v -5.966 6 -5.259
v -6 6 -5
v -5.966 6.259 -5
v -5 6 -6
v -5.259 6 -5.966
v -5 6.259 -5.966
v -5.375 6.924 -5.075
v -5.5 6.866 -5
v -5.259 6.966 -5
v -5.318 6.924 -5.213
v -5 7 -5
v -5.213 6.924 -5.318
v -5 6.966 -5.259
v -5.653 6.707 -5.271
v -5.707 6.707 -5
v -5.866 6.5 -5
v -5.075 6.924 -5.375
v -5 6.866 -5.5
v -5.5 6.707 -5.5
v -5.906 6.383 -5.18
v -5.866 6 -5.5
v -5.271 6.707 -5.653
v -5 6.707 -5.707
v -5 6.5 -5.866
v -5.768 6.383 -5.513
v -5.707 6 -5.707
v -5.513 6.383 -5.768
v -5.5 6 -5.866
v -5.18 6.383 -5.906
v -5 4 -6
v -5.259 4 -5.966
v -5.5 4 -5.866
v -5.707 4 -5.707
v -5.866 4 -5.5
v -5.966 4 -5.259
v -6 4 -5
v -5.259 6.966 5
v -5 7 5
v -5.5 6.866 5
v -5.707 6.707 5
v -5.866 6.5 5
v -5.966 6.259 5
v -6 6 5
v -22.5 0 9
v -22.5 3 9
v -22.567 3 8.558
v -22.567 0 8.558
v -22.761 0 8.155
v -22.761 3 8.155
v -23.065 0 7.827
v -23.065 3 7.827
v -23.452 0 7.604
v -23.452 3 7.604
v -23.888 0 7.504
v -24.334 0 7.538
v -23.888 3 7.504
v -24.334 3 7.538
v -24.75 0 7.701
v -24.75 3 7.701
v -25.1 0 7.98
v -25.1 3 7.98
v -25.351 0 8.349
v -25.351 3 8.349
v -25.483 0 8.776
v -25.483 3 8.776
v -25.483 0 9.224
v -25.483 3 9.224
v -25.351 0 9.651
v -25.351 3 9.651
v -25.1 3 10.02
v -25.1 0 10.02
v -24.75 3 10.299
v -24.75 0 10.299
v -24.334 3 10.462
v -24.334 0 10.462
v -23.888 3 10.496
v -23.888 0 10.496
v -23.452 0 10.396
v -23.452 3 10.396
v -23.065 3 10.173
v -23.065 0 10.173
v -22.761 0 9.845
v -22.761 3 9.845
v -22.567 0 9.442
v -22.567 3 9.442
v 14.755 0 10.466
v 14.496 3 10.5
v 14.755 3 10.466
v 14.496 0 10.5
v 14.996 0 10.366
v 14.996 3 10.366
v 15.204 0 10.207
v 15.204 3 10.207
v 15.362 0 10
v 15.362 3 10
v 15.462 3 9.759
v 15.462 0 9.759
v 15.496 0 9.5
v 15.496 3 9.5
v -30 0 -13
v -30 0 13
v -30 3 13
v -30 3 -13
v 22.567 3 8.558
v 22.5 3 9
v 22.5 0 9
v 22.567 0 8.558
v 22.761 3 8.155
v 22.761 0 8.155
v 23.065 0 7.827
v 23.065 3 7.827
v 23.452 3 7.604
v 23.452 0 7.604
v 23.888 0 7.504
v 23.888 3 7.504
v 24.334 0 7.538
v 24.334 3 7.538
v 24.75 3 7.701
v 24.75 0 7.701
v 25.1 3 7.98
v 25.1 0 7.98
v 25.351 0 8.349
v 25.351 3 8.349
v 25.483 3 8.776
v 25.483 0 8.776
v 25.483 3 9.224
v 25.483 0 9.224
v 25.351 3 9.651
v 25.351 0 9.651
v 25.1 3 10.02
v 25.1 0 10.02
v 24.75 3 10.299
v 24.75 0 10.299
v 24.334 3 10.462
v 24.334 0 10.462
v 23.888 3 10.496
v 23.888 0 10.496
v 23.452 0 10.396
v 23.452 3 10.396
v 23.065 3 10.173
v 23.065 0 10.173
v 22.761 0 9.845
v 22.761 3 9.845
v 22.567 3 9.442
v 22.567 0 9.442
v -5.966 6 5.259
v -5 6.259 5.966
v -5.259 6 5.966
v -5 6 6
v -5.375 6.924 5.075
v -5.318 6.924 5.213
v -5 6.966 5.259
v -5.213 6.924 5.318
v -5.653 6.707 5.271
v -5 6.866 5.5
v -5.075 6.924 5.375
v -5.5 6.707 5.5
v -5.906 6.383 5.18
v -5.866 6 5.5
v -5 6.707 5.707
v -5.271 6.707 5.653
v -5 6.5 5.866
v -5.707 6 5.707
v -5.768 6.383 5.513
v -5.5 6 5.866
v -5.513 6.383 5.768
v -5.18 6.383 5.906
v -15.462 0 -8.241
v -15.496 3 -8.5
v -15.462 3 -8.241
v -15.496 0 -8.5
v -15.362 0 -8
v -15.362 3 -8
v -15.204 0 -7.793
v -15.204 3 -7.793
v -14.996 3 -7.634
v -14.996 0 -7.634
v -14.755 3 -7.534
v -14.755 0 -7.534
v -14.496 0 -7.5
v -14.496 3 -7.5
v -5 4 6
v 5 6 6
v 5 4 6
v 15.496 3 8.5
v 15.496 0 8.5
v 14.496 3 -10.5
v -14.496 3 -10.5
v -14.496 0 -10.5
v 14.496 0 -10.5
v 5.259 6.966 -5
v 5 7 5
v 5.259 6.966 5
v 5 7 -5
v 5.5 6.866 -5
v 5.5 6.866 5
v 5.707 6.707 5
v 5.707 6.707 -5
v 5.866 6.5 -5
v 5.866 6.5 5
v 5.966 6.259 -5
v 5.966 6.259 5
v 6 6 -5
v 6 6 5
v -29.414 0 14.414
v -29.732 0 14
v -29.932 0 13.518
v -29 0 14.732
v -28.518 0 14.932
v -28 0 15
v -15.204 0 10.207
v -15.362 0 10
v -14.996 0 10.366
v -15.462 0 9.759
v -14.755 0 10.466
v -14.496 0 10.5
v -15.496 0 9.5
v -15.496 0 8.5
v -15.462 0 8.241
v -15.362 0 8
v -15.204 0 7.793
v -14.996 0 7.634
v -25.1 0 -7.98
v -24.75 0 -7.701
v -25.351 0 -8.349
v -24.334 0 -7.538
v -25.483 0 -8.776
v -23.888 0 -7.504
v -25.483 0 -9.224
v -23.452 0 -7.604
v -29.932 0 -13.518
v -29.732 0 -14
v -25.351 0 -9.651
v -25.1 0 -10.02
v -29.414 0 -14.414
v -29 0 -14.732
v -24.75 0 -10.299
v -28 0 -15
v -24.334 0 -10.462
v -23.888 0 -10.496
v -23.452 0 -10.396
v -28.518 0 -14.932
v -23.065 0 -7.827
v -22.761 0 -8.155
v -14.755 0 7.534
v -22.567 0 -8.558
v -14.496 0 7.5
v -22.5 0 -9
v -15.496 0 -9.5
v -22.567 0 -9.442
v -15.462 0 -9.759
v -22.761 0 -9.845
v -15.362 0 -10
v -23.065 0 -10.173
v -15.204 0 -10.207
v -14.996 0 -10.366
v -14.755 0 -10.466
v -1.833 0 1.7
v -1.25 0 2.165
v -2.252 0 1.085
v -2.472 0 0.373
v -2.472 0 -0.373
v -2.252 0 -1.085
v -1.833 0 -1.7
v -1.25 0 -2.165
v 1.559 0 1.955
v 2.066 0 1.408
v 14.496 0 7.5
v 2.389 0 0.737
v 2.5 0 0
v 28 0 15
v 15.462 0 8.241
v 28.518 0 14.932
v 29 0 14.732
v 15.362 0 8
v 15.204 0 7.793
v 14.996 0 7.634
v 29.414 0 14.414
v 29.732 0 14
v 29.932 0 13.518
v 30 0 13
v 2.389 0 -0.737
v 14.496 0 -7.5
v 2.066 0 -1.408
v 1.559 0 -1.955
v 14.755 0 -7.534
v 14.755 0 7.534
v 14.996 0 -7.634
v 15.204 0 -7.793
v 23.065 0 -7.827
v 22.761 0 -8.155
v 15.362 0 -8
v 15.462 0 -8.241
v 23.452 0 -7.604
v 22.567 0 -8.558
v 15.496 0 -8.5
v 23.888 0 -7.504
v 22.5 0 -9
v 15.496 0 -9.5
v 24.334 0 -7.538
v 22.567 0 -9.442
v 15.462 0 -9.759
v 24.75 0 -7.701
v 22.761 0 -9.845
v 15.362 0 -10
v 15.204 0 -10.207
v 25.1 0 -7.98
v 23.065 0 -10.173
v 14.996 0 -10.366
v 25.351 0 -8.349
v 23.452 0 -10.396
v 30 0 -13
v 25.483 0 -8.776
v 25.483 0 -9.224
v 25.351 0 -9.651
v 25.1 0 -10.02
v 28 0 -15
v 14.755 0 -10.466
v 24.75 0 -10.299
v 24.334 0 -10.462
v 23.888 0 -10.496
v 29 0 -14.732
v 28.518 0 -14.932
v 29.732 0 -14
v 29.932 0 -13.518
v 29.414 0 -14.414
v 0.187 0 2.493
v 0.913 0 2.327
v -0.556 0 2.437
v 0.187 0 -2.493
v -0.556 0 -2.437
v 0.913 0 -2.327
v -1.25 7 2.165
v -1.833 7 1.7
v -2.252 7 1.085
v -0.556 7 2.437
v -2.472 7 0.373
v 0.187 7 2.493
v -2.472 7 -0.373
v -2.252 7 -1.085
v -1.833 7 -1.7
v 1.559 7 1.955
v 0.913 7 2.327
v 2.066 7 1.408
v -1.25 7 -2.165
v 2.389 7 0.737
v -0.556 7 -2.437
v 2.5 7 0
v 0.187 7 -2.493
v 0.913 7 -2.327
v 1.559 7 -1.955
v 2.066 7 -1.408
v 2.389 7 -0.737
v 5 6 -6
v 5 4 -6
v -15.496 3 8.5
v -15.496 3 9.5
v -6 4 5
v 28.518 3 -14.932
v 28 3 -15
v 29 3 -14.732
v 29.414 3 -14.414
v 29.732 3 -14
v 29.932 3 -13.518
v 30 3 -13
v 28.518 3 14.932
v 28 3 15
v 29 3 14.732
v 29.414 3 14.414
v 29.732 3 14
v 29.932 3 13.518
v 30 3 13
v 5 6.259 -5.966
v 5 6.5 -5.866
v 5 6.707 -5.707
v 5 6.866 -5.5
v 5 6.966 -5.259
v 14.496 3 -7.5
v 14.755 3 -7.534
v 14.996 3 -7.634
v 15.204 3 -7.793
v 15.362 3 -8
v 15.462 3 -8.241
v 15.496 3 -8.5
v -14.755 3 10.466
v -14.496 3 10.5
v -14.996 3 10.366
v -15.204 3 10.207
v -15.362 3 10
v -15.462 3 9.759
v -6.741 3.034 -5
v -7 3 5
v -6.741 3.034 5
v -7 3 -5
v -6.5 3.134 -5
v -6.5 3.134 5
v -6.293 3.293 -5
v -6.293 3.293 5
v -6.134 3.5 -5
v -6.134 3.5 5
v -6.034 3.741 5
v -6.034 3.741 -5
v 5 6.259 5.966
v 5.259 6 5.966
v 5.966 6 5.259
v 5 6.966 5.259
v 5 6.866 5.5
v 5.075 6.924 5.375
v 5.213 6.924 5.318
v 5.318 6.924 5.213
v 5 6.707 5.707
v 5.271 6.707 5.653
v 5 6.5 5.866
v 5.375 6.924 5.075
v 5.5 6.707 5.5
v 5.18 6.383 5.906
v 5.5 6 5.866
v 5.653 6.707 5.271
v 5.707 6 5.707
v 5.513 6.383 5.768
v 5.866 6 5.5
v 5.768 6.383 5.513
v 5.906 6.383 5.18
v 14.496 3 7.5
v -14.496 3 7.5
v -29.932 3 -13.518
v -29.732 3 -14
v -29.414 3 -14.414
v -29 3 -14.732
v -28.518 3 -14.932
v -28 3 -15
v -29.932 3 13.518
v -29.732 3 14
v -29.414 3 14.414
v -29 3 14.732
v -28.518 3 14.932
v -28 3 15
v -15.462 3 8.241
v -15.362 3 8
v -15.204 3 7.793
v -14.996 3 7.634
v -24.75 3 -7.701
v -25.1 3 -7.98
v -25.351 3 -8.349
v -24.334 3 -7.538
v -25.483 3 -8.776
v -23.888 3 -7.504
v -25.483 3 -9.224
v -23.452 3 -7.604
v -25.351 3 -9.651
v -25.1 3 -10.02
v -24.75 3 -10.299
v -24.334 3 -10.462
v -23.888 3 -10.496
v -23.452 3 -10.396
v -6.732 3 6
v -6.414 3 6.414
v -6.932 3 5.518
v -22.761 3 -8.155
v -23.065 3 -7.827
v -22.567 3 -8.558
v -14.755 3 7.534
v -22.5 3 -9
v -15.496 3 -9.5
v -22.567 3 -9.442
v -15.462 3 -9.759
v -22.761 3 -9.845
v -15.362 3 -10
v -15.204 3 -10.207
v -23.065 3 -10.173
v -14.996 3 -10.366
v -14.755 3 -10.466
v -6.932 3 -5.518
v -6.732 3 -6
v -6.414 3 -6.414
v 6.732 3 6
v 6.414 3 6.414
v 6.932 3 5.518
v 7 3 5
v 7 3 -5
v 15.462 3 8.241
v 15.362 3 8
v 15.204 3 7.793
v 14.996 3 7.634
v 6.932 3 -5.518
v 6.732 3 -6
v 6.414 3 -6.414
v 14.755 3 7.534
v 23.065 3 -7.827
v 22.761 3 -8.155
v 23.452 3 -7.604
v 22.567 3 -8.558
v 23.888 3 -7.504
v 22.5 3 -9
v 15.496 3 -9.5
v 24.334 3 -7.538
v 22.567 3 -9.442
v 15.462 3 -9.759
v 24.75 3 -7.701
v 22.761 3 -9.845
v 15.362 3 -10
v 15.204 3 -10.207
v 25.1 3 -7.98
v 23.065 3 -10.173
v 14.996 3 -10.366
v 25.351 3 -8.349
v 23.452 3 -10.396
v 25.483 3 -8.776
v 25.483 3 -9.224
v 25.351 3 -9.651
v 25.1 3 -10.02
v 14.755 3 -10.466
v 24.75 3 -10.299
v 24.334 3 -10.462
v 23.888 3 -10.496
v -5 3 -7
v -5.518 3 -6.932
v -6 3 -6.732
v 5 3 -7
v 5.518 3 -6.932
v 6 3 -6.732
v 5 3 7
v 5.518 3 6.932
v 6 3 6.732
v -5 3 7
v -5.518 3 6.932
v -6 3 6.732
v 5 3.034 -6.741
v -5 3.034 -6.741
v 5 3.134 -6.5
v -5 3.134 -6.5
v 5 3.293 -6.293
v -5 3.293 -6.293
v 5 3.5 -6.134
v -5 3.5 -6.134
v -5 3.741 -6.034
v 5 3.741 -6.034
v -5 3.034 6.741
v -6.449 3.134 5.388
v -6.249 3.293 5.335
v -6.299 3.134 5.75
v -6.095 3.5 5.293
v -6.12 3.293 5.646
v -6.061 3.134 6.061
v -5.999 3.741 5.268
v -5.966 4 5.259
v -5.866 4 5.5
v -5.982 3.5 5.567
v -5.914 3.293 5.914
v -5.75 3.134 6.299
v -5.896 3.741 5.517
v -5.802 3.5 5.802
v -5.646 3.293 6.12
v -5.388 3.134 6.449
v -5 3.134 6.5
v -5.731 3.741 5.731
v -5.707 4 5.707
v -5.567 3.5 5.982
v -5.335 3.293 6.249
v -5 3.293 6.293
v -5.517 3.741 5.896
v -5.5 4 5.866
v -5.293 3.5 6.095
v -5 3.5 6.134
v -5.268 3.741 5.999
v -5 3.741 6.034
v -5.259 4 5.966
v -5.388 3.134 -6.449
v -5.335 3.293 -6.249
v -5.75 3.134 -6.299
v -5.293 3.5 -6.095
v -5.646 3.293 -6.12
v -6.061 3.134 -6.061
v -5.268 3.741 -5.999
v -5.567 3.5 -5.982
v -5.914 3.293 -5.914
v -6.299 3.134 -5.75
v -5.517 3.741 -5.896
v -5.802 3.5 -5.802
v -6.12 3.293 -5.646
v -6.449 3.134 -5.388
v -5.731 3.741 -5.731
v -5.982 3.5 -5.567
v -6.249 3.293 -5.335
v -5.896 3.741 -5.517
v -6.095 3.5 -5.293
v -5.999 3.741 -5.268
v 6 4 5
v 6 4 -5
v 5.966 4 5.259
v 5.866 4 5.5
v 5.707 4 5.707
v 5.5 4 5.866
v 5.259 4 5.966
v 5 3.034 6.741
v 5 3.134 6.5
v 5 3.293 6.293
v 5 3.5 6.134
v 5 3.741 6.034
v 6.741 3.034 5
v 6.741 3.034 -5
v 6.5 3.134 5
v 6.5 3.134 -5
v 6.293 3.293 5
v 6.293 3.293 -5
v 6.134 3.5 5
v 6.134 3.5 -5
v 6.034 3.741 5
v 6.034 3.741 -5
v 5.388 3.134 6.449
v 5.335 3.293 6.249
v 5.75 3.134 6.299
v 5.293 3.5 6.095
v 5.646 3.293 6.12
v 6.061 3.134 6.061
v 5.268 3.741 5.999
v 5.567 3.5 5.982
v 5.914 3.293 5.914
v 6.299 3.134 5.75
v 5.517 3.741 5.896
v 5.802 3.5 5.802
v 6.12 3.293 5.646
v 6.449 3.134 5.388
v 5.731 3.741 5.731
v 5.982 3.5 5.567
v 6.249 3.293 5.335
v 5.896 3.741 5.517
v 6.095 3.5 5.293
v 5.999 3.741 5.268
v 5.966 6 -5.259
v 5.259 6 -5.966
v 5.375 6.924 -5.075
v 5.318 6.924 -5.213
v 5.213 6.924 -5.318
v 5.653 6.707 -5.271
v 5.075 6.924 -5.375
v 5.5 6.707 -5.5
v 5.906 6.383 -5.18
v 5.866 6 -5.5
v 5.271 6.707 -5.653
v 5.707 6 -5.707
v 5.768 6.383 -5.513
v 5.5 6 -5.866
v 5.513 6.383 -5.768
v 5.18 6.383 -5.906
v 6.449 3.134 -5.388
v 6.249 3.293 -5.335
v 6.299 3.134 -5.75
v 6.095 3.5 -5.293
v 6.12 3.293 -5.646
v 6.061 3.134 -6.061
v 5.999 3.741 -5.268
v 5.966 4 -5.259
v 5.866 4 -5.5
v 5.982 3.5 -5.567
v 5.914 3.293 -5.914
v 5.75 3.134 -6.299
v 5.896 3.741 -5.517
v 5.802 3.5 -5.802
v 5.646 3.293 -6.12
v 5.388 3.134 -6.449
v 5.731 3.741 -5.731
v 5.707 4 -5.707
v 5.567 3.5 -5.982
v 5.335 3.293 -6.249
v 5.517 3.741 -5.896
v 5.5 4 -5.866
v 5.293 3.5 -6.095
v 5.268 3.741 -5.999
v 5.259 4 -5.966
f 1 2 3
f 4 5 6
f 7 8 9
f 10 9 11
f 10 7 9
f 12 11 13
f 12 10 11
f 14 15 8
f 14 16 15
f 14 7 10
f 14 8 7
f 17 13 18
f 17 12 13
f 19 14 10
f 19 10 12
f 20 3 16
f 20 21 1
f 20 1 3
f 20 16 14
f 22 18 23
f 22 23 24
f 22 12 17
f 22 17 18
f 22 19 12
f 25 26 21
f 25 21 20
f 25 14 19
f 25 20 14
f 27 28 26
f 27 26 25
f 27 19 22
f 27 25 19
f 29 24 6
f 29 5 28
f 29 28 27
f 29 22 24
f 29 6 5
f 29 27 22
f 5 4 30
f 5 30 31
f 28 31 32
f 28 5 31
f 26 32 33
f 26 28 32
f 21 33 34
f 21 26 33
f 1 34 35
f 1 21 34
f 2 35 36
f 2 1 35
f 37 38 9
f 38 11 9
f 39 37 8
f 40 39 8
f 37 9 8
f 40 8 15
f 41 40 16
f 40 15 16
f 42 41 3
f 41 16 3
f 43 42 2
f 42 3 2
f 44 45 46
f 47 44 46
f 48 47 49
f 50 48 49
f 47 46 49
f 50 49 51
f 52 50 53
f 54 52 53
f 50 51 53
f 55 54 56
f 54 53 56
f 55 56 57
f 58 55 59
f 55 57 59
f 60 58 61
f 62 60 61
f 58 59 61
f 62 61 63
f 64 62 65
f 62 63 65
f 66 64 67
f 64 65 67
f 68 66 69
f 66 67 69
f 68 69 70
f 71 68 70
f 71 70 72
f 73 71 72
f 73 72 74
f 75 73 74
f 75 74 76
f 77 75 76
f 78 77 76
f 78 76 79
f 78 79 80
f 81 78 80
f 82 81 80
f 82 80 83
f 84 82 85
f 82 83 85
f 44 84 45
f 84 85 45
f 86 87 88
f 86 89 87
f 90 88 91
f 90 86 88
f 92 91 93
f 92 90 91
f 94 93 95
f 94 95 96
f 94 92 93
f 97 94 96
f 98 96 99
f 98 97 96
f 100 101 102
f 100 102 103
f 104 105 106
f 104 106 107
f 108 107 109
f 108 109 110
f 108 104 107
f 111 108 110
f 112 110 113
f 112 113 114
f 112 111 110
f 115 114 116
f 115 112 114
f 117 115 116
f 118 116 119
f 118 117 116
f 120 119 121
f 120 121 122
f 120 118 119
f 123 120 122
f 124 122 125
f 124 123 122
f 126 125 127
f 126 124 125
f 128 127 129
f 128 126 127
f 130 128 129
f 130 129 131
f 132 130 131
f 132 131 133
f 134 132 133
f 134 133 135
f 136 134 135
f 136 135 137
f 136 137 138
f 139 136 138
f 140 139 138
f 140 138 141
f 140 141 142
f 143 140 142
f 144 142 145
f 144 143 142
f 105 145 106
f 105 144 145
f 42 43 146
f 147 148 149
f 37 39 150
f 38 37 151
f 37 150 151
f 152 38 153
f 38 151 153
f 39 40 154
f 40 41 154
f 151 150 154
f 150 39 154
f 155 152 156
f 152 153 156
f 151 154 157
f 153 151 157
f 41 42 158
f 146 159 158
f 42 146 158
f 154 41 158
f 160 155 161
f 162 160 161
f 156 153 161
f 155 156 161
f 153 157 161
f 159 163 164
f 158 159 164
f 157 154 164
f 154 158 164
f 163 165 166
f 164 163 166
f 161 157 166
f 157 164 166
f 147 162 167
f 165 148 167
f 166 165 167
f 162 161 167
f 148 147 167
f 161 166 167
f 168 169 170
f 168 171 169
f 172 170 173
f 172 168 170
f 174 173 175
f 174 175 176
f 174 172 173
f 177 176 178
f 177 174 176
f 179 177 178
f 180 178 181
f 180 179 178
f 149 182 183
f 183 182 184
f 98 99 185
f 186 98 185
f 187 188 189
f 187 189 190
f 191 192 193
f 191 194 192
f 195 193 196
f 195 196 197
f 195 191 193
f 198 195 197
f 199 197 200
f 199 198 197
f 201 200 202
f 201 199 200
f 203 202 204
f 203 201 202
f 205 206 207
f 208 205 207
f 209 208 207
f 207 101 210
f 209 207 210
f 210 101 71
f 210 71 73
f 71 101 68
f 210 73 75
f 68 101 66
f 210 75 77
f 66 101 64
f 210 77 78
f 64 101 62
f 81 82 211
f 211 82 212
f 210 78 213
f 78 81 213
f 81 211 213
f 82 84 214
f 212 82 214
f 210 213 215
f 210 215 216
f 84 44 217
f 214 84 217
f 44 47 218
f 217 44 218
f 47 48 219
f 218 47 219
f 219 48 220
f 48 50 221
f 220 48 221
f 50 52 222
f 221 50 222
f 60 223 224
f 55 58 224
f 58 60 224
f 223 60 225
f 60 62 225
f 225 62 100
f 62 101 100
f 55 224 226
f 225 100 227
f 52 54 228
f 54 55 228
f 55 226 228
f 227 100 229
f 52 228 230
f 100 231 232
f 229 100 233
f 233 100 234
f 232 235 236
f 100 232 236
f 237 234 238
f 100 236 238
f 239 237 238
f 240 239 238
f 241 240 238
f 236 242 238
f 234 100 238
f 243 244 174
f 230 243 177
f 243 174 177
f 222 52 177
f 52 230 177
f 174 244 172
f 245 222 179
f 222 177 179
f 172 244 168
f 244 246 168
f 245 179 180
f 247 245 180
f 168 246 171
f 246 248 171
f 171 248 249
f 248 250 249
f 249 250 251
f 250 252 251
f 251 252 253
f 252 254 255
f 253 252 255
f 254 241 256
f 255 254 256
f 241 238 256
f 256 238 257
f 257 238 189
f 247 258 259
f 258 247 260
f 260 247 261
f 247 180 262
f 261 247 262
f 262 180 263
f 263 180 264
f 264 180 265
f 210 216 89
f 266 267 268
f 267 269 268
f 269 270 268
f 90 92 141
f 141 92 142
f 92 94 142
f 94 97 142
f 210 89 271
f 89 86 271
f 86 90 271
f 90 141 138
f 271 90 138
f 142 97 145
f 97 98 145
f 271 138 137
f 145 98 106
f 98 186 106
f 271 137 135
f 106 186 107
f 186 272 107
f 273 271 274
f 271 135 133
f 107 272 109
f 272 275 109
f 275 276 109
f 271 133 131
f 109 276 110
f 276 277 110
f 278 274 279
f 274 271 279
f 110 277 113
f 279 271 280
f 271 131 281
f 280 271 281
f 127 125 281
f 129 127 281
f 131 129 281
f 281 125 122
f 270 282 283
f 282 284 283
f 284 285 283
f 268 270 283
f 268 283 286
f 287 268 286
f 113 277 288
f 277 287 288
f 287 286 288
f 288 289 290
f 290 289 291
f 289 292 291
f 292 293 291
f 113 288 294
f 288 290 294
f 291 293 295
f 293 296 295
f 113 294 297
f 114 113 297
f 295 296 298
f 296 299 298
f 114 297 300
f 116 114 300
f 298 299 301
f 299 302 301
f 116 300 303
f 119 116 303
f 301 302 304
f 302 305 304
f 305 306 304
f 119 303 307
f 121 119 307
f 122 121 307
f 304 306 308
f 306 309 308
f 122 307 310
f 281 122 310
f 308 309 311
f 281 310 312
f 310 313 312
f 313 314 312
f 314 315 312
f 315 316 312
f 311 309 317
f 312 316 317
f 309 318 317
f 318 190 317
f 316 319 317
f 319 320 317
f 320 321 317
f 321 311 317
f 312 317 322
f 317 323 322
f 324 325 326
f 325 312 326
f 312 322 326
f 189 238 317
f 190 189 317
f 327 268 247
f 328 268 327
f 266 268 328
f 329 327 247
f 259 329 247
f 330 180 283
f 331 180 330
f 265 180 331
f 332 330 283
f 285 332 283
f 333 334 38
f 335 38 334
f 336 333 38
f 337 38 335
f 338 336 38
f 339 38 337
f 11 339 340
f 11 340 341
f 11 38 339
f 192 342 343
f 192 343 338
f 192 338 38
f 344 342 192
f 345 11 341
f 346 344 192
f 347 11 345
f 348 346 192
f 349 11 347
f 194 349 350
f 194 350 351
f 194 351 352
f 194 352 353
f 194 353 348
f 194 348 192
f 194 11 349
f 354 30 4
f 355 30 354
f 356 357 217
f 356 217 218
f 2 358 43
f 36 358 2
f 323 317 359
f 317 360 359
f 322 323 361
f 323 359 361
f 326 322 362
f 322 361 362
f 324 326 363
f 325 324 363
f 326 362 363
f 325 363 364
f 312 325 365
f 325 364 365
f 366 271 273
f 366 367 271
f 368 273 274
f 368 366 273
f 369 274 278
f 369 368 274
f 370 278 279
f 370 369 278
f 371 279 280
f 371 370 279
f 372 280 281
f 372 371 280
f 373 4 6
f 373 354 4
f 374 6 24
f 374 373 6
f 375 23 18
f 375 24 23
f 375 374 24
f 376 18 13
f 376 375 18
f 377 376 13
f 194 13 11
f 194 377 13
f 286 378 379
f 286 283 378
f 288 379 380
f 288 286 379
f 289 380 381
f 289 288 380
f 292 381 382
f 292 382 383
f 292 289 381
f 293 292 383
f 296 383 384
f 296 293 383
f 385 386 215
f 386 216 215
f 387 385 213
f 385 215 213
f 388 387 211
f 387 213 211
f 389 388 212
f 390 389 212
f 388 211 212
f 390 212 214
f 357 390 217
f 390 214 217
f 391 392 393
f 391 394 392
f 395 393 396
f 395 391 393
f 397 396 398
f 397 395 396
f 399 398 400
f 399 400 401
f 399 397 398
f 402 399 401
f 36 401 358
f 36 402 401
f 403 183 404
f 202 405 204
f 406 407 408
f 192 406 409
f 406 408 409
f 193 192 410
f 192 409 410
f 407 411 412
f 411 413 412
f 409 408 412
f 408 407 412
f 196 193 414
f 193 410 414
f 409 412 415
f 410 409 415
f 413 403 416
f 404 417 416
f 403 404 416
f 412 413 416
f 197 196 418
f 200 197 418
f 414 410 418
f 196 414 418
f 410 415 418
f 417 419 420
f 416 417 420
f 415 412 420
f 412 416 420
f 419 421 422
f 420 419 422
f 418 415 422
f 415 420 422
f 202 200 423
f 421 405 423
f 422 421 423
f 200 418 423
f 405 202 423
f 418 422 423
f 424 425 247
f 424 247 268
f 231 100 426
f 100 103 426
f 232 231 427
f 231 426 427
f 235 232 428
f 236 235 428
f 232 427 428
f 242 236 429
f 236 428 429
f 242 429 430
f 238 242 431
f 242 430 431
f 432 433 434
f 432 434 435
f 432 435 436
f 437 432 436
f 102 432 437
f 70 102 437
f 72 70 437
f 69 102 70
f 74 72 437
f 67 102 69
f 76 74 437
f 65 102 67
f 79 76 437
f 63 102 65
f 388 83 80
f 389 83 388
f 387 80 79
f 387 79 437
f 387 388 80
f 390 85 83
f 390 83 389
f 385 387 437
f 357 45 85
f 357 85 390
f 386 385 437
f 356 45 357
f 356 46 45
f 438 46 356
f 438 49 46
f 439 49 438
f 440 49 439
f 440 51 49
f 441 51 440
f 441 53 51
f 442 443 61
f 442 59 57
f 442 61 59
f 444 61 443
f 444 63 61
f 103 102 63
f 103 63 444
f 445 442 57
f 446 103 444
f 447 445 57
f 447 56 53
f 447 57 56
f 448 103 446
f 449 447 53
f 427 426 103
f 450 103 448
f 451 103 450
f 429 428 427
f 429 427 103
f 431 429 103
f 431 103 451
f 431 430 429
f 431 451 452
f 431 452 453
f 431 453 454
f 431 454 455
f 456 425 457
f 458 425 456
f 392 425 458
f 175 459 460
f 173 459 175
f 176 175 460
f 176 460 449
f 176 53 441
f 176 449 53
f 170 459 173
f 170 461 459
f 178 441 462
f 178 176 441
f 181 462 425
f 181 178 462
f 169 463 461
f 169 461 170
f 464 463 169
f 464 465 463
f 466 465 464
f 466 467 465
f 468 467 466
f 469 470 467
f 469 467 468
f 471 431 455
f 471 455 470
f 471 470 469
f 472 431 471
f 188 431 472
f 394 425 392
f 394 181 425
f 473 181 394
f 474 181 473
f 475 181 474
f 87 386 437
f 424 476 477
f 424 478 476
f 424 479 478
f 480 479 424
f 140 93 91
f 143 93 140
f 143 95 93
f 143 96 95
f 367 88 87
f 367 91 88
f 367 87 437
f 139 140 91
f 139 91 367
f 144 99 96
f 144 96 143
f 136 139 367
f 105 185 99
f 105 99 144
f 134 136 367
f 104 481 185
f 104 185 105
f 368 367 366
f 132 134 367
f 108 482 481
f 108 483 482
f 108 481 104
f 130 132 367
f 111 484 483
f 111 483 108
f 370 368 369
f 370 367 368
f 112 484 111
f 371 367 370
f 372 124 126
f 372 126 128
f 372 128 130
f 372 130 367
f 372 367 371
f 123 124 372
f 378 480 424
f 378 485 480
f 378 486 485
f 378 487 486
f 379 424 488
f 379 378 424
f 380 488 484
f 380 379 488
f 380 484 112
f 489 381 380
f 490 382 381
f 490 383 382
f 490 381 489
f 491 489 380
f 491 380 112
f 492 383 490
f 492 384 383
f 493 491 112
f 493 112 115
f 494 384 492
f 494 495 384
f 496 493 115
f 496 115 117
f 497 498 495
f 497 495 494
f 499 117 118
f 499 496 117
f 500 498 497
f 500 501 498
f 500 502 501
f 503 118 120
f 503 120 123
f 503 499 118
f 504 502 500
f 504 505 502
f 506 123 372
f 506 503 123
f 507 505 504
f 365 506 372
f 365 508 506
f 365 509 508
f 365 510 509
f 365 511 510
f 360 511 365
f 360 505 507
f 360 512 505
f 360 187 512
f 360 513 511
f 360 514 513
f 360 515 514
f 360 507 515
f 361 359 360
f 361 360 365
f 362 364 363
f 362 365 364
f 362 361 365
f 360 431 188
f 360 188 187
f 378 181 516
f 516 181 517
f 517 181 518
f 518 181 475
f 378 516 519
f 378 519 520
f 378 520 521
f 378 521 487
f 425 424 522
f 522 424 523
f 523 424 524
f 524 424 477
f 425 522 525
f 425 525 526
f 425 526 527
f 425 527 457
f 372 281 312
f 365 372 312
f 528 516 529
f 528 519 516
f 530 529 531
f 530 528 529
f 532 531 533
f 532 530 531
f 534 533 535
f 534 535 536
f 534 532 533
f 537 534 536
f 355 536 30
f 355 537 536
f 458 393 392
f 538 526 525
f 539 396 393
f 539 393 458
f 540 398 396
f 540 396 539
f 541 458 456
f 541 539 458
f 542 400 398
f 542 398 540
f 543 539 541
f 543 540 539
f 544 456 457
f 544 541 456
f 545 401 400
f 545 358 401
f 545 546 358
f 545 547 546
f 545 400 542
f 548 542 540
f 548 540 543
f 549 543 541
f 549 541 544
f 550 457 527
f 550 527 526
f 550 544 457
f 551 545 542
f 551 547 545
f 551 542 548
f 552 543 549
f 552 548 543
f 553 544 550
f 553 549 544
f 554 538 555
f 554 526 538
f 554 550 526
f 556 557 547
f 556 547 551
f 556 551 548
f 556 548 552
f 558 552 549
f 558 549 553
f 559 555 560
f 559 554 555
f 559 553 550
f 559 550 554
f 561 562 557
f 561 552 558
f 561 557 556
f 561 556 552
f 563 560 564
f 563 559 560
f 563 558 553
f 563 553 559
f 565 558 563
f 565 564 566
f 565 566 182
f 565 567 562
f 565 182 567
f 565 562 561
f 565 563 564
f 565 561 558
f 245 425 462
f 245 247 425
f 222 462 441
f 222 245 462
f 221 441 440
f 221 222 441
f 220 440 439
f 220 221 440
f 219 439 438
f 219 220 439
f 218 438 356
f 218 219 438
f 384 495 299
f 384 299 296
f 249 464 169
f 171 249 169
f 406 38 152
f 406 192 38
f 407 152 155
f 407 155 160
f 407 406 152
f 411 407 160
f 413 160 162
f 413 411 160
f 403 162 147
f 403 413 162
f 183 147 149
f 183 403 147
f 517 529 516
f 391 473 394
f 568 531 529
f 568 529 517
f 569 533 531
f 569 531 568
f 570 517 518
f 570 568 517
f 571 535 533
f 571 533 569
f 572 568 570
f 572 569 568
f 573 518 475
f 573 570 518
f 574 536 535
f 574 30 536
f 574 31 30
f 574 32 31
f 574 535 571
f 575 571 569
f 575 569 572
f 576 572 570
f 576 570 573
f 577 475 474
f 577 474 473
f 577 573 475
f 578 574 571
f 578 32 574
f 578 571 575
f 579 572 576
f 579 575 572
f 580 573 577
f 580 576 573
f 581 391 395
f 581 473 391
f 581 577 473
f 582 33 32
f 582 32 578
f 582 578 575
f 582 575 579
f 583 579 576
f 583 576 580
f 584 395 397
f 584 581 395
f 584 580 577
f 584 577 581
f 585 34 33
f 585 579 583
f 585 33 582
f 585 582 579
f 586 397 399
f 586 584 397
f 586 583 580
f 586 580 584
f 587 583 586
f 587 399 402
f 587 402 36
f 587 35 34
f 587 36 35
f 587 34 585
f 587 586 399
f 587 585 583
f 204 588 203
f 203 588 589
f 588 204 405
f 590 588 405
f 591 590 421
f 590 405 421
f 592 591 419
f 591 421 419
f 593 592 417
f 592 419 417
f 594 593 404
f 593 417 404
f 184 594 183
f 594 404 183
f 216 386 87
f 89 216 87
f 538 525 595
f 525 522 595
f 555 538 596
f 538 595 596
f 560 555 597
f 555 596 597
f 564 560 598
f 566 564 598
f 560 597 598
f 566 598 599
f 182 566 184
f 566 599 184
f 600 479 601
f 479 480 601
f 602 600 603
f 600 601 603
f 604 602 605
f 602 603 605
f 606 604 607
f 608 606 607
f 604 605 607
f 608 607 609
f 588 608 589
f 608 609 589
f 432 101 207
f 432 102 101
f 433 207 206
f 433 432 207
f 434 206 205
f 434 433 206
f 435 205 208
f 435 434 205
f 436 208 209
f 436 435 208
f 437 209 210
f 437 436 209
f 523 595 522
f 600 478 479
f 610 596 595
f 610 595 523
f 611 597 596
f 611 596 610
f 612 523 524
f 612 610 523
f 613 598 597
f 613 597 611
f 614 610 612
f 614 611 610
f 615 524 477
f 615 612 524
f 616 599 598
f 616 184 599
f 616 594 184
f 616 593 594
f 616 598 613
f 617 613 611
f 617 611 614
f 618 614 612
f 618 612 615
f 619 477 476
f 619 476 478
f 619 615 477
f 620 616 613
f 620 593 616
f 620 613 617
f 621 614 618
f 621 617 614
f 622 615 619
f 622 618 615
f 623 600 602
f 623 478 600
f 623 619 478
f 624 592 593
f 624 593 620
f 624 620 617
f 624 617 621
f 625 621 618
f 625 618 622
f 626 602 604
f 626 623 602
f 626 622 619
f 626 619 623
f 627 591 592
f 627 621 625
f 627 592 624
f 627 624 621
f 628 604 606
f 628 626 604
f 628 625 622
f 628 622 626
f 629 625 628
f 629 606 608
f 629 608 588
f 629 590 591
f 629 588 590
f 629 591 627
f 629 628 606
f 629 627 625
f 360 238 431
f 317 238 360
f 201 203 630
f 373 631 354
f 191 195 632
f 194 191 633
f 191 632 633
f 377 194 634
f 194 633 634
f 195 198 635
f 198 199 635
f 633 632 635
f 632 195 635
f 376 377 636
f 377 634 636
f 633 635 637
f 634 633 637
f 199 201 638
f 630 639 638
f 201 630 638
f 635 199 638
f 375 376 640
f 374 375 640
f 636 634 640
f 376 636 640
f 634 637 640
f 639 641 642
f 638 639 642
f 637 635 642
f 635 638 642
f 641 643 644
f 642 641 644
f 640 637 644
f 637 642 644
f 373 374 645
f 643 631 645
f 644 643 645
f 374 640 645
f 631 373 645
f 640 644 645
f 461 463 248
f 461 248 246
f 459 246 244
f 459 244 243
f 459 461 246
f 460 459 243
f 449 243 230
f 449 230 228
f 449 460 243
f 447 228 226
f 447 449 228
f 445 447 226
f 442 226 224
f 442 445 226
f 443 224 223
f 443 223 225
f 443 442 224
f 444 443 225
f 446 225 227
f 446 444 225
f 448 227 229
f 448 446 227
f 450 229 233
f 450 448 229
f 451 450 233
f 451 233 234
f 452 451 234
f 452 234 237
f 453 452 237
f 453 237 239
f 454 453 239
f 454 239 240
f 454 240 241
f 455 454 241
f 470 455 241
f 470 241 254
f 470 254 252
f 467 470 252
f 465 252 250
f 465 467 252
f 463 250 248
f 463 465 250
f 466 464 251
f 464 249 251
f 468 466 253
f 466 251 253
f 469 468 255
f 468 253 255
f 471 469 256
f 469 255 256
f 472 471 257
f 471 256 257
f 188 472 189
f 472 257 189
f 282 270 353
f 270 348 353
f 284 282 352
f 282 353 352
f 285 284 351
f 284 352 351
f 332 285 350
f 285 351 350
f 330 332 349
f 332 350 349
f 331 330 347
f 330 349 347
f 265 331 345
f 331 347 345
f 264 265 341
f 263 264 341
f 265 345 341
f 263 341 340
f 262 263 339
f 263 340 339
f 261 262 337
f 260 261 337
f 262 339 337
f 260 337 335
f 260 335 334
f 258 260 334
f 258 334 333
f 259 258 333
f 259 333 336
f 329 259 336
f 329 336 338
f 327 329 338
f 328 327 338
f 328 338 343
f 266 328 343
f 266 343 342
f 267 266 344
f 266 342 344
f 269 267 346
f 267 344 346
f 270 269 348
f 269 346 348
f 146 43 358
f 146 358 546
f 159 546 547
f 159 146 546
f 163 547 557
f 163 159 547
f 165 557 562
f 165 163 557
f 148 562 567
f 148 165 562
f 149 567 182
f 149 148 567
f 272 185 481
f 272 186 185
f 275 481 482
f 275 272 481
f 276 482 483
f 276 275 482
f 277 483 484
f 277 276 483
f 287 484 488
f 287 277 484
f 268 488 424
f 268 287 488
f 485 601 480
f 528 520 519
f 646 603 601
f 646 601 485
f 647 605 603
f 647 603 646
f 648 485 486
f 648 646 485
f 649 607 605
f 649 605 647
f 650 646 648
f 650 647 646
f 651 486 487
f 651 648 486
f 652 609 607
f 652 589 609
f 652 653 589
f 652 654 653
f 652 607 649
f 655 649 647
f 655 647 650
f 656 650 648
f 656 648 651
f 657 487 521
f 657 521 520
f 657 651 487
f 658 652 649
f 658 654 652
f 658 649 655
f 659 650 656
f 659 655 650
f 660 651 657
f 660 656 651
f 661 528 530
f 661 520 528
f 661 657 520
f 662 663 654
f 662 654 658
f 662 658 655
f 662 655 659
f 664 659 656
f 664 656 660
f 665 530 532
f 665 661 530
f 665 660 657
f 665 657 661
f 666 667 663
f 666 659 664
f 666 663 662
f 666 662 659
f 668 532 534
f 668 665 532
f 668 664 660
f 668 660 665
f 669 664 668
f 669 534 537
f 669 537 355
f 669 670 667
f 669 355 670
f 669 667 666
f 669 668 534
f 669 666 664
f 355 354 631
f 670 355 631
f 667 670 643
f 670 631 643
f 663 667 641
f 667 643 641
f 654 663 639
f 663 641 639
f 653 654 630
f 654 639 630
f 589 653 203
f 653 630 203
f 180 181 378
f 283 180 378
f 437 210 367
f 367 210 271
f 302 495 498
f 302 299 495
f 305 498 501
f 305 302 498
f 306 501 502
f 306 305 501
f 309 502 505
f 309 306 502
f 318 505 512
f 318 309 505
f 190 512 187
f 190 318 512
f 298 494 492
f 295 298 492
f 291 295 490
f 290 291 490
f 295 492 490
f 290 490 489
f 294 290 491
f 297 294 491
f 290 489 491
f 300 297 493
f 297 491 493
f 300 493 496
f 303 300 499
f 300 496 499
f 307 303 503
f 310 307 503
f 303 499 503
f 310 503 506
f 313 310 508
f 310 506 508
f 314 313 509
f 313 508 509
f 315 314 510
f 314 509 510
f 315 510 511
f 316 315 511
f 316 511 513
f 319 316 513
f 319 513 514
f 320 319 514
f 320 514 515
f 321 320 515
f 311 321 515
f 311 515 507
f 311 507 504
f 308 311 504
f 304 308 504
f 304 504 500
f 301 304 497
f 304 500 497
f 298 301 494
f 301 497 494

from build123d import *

# Parameters (mm, degrees)
SKETCH_1_W               = 60
SKETCH_1_H               = 30
EXTRUDE_1_DEPTH          = 3
SKETCH_2_R               = 1.5
CUT_EXTRUDE_1_DEPTH      = 3
SKETCH_5_W               = 12
SKETCH_5_H               = 12
EXTRUDE_2_DEPTH          = 4
MIRROR_2_COPY_1_SKETCH_R = 1.5
MIRROR_2_COPY_1_DEPTH    = 3
SKETCH_3_W               = 30.992816336
SKETCH_3_H               = 3
CUT_EXTRUDE_2_DEPTH      = 3
FILLET_1_R               = 1
FILLET_1_OF_MIRROR_3_R   = 1
FILLET_2_R               = 2
SKETCH_4_R               = 2.5
CUT_EXTRUDE_3_DEPTH      = 5
CUT_EXTRUDE_3_DEPTH_BACK = 4
FILLET_3_R               = 1


with BuildPart() as part:
    # 草图1 → 凸台-拉伸1 (new body)
    with BuildSketch(Plane(origin=(0, 0, 0), x_dir=(1, 0, 0), z_dir=(0, 1, 0))):
        Rectangle(SKETCH_1_W, SKETCH_1_H)
    extrude(amount=EXTRUDE_1_DEPTH)

    # 草图2 → 切除-拉伸1 (cut)
    with BuildSketch(Plane(origin=(0, 3, 0), x_dir=(1, 0, 0), z_dir=(0, 1, 0))):
        with Locations((-24, -9)):
            Circle(SKETCH_2_R)
    cut_extrude_1 = extrude(amount=-CUT_EXTRUDE_1_DEPTH, mode=Mode.SUBTRACT)

    # 草图5 → 凸台-拉伸2 (add)
    with BuildSketch(Plane(origin=(0, 3, 0), x_dir=(1, 0, 0), z_dir=(0, 1, 0))):
        Rectangle(SKETCH_5_W, SKETCH_5_H)
    extrude(amount=EXTRUDE_2_DEPTH)

    # 镜向1: 切除-拉伸1 across plane
    add(cut_extrude_1.mirror(Plane.XY), mode=Mode.SUBTRACT)

    # 镜向2: 切除-拉伸1 across plane
    add(cut_extrude_1.mirror(Plane(origin=(0, 0, 0), x_dir=(0, 0, 1), z_dir=(1, 0, 0))), mode=Mode.SUBTRACT)

    # 镜向2 copy 1 sketch → 镜向2 copy 1 (cut)
    with BuildSketch(Plane(origin=(0, 3, 0), x_dir=(-1, 0, 0), z_dir=(0, 1, 0))):
        with Locations((-24, -9)):
            Circle(MIRROR_2_COPY_1_SKETCH_R)
    extrude(amount=-MIRROR_2_COPY_1_DEPTH, mode=Mode.SUBTRACT)

    # 草图3 → 切除-拉伸2 (cut)
    with BuildSketch(Plane(origin=(0, 3, 0), x_dir=(1, 0, 0), z_dir=(0, 1, 0))):
        with Locations((0, -9)):
            Rectangle(SKETCH_3_W, SKETCH_3_H)
    cut_extrude_2 = extrude(amount=-CUT_EXTRUDE_2_DEPTH, mode=Mode.SUBTRACT)

    # 圆角1
    fillet_1_edges = [part.edges().sort_by_distance(p)[0] for p in [
        (-15.496408168, 1.5, 10.5),
        (-15.496408168, 1.5, 7.5),
        (15.496408168, 1.5, 7.5),
        (15.496408168, 1.5, 10.5),
    ]]
    fillet(fillet_1_edges, radius=FILLET_1_R)

    # 镜向3: 切除-拉伸2 across plane
    add(cut_extrude_2.mirror(Plane.XY), mode=Mode.SUBTRACT)

    # 圆角1 of 镜向3
    fillet_1_of_mirror_3_edges = [part.edges().sort_by_distance(p)[0] for p in [
        (-15.496408168, 1.5, -10.5),
        (-15.496408168, 1.5, -7.5),
        (15.496408168, 1.5, -7.5),
        (15.496408168, 1.5, -10.5),
    ]]
    fillet(fillet_1_of_mirror_3_edges, radius=FILLET_1_OF_MIRROR_3_R)

    # 圆角2
    fillet_2_edges = [part.edges().sort_by_distance(p)[0] for p in [
        (-30, 1.5, -15),
        (30, 1.5, -15),
        (30, 1.5, 15),
        (-30, 1.5, 15),
    ]]
    fillet(fillet_2_edges, radius=FILLET_2_R)

    # 草图4 → 切除-拉伸3 (cut, two sides)
    with BuildSketch(Plane(origin=(0, 3, 0), x_dir=(1, 0, 0), z_dir=(0, 1, 0))) as cut_extrude_3_sk:
        Circle(SKETCH_4_R)
    extrude(amount=CUT_EXTRUDE_3_DEPTH, mode=Mode.SUBTRACT)
    extrude(cut_extrude_3_sk.sketch, amount=-CUT_EXTRUDE_3_DEPTH_BACK, mode=Mode.SUBTRACT)

    # 圆角3
    fillet_3_edges = [part.edges().sort_by_distance(p)[0] for p in [
        (-6, 3, 0),
        (-6, 5, -6),
        (0, 3, 6),
        (-6, 5, 6),
        (6, 3, 0),
        (6, 5, 6),
        (0, 3, -6),
        (6, 5, -6),
        (-6, 7, 0),
        (0, 7, 6),
        (6, 7, 0),
        (0, 7, -6),
    ]]
    fillet(fillet_3_edges, radius=FILLET_3_R)


solid = part.part
